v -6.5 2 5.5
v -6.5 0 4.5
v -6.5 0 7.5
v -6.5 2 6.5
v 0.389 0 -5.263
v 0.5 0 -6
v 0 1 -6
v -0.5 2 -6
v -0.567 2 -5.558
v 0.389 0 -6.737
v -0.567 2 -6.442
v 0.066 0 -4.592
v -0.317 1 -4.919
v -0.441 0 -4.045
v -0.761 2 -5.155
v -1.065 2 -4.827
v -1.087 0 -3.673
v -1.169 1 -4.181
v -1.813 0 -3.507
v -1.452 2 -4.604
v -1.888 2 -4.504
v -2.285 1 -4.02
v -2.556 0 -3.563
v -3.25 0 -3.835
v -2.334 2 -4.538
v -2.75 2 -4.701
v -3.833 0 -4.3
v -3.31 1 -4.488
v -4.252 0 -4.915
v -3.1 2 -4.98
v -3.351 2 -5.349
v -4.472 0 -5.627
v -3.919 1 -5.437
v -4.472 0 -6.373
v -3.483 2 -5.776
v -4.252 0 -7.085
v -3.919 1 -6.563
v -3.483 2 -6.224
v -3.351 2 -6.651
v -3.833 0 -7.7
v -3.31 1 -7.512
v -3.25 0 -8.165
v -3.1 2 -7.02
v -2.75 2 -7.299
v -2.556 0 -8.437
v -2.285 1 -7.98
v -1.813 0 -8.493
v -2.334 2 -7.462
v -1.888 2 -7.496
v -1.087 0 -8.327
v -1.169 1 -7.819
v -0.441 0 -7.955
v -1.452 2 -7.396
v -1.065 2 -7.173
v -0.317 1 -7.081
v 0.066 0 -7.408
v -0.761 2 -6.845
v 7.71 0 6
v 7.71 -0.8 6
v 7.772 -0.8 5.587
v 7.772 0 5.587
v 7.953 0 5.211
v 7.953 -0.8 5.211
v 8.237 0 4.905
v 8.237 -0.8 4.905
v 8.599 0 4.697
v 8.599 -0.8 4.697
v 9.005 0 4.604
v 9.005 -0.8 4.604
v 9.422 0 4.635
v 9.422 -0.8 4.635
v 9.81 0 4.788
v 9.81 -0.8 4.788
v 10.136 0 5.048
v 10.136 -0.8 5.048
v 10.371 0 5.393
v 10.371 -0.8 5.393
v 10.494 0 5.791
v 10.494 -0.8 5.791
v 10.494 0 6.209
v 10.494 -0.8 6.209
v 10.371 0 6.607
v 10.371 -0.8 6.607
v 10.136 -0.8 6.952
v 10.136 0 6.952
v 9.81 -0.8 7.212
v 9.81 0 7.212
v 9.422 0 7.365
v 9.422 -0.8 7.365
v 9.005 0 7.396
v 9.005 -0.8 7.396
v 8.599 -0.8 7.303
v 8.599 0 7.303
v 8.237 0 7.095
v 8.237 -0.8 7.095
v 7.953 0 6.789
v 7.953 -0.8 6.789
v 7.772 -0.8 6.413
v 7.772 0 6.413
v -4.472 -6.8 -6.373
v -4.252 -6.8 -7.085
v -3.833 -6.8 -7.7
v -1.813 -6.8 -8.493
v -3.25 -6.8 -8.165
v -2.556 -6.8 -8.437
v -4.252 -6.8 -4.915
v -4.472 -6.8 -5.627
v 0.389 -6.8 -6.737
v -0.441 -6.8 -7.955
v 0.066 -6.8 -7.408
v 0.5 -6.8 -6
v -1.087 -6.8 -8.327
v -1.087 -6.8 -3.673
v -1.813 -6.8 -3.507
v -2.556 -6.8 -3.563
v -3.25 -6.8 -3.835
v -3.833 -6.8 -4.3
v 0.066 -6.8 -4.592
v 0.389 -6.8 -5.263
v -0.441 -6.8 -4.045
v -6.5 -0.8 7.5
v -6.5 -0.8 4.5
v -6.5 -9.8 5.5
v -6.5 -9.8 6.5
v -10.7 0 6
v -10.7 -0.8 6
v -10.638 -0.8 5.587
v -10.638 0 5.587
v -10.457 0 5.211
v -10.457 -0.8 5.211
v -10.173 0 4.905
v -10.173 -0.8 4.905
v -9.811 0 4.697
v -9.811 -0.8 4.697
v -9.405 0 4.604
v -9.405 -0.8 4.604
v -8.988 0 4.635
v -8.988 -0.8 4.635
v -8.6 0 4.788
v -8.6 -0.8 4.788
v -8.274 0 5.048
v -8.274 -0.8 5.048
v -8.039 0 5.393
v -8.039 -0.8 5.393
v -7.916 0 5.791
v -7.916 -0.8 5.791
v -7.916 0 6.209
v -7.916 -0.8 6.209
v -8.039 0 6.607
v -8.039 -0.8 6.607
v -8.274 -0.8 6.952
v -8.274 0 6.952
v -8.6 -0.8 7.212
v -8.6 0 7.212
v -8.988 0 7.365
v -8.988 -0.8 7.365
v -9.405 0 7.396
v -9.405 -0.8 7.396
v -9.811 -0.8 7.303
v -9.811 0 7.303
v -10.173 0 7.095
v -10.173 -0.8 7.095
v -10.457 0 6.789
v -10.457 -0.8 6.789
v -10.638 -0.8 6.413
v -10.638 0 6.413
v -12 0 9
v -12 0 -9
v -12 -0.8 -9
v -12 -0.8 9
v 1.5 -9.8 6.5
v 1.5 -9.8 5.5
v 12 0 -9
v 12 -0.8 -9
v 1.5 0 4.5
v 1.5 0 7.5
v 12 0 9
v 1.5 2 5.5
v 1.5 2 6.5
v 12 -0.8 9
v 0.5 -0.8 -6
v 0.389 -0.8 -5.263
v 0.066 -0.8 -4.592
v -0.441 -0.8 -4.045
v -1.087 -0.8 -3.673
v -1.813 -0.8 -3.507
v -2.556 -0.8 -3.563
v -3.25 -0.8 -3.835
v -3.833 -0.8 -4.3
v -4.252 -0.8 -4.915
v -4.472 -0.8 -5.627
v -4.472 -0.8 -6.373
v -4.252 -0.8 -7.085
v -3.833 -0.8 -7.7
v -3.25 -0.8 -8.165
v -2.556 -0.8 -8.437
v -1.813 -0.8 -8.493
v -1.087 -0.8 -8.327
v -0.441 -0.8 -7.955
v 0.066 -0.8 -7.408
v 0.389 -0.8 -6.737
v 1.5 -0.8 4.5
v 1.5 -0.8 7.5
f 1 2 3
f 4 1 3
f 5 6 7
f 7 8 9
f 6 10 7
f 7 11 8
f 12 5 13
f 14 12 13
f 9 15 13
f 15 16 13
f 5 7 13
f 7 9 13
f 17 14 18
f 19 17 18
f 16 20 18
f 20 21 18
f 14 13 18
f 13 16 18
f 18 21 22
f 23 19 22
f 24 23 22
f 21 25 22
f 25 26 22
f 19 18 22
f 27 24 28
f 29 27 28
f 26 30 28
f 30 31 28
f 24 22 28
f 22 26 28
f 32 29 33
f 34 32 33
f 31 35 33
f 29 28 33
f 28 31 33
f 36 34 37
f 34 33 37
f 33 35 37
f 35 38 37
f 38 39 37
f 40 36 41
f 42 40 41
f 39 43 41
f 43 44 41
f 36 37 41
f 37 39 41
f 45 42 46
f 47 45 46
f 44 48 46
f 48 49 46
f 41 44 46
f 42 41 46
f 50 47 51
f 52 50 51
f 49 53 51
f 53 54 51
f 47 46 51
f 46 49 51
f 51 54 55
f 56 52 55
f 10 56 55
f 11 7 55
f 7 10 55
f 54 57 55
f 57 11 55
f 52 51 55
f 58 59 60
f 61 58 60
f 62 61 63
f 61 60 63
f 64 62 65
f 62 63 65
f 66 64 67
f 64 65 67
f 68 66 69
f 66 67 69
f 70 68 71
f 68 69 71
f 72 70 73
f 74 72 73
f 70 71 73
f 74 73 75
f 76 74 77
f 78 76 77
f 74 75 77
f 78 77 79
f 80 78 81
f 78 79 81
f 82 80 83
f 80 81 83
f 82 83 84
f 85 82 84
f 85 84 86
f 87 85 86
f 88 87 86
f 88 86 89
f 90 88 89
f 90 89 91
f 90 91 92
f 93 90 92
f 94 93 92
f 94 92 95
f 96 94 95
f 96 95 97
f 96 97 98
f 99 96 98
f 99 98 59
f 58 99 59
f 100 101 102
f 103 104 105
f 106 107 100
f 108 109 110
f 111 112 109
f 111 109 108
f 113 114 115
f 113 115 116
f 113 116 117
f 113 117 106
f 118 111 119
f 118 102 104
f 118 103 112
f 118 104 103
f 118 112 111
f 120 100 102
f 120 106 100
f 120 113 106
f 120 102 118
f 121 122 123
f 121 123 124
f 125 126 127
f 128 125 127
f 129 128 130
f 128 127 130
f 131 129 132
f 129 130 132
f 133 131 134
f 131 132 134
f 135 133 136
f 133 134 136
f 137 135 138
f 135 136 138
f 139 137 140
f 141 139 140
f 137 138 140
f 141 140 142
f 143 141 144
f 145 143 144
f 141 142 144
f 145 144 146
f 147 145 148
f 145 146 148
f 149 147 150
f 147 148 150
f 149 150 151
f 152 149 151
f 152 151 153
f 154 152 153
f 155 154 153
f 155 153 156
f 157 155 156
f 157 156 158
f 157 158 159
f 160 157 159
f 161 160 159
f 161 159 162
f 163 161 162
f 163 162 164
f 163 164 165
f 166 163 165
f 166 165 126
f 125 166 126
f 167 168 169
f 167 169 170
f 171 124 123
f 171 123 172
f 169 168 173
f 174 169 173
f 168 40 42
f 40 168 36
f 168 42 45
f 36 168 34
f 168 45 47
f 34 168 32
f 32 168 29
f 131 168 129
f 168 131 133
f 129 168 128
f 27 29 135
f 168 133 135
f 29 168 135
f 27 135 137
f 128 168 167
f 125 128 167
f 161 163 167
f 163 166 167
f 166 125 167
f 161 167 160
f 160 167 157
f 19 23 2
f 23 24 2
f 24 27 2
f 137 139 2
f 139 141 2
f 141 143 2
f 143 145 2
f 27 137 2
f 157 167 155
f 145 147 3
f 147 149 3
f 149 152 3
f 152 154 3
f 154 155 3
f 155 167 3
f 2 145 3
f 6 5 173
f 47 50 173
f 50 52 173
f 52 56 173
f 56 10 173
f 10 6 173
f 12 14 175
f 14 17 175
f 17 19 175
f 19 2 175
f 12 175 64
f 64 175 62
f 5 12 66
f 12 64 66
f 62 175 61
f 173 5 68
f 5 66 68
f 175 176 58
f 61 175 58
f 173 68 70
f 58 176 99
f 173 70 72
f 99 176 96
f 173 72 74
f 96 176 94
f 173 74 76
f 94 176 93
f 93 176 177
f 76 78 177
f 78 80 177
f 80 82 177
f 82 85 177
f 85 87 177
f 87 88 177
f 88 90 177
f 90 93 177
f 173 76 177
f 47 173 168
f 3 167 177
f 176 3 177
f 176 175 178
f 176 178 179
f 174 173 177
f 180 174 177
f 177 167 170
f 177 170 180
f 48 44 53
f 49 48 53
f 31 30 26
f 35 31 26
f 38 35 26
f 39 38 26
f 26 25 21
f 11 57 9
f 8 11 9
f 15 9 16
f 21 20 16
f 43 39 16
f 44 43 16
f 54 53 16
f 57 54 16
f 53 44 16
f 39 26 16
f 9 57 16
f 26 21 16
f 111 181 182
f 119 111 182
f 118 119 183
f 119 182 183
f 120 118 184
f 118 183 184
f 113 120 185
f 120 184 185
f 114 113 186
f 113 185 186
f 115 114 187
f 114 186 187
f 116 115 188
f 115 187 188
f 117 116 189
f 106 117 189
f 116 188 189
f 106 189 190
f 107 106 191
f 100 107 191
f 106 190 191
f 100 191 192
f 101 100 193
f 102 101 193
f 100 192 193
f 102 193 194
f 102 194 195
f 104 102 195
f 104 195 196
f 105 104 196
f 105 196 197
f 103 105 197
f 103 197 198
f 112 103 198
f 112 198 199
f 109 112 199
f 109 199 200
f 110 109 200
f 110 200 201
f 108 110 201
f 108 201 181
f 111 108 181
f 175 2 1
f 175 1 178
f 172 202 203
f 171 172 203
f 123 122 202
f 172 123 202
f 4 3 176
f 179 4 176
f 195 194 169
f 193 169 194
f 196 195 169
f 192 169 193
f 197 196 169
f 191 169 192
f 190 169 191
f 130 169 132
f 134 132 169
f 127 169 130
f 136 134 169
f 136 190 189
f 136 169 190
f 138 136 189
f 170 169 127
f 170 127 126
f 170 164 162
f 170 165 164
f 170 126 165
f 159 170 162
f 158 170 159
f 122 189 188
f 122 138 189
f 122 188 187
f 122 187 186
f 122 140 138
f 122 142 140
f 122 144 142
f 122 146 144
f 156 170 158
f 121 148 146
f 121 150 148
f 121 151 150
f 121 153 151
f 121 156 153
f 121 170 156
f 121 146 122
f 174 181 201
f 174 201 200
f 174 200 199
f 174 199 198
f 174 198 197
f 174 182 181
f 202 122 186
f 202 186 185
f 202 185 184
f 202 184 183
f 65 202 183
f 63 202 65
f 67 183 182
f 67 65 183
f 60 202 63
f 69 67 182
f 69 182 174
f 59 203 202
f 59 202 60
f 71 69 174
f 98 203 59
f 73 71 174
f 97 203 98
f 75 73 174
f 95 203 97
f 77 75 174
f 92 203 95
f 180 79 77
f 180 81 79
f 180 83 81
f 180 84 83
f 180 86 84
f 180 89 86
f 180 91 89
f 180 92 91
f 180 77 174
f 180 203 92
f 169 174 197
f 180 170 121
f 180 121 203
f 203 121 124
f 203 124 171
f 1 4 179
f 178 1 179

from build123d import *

# Parameters (mm, degrees)
F0_W     = 24
F0_H     = 18
F0_R     = 2.5
F0_W_2   = 8
F0_H_2   = 3
F1_DEPTH = 0.8
F2_D     = 2.8
F3_DEPTH = 2
F4_SIZE2 = 1.99999
F4_SIZE  = 0.99999
F5_SIZE2 = 0.99999
F5_SIZE  = 1.99999
F6_DEPTH = 6.8
F7_DEPTH = 9.8
F8_SIZE2 = 8.99999
F8_SIZE  = 0.99999


# Not quite as in the source:
# - a fillet or chamfer is up to 0.001 mm smaller than in the source, because OpenCascade refuses the exact size


with BuildPart() as f1:
    # F0 (on Front) → F1 (new body)
    with BuildSketch(Plane.XZ):
        Rectangle(F0_W, F0_H)
        with Locations((-2, -6)):
            Circle(F0_R, mode=Mode.SUBTRACT)
        with Locations((-2.5, 6)):
            Rectangle(F0_W_2, F0_H_2, mode=Mode.SUBTRACT)
        with Locations((-2.5, 6)):
            Rectangle(F0_W_2, F0_H_2)
        with Locations((-2, -6)):
            Circle(F0_R)
    extrude(amount=F1_DEPTH)

    # F2 (through all)
    with Locations(Plane(origin=(0, 0, 0), x_dir=(1, 0, 0), z_dir=(0, 1, 0))):
        with Locations((-9.3, -6), (9.11, -6)):
            Hole(F2_D / 2)

    # F0 (on Front) → F3 (join)
    with BuildSketch(Plane.XZ):
        with Locations((-2.5, 6)):
            Rectangle(F0_W_2, F0_H_2)
        with Locations((-2, -6)):
            Circle(F0_R)
    extrude(amount=-F3_DEPTH)

    # F4 (size 1 and 2 in the source; OpenCascade refuses exactly that, so slightly less here)
    f4_edges = [f1.edges().sort_by_distance(p)[0] for p in [
        (-2.5, 2, 4.5),
        (-2.5, 2, 7.5),
    ]]
    f4_side = f1.faces().sort_by_distance((-2.5, 2, 6))[0]
    chamfer(f4_edges, length=F4_SIZE, length2=F4_SIZE2, reference=f4_side)

    # F5 (size 2 and 1 in the source; OpenCascade refuses exactly that, so slightly less here)
    f5_edges = [f1.edges().sort_by_distance(p)[0] for p in [
        (-4.5, 2, -6),
    ]]
    f5_side = f1.faces().sort_by_distance((-4.5, 1, -6))[0]
    chamfer(f5_edges, length=F5_SIZE, length2=F5_SIZE2, reference=f5_side)

    # F0 (on Front) → F6 (join)
    with BuildSketch(Plane.XZ):
        with Locations((-2, -6)):
            Circle(F0_R)
    extrude(amount=F6_DEPTH)

    # F0 (on Front) → F7 (join)
    with BuildSketch(Plane.XZ):
        with Locations((-2.5, 6)):
            Rectangle(F0_W_2, F0_H_2)
    extrude(amount=F7_DEPTH)

    # F8 (size 1 and 9 in the source; OpenCascade refuses exactly that, so slightly less here)
    f8_edges = [f1.edges().sort_by_distance(p)[0] for p in [
        (-2.5, -9.8, 7.5),
        (-2.5, -9.8, 4.5),
    ]]
    f8_side = f1.faces().sort_by_distance((-2.5, -9.8, 6))[0]
    chamfer(f8_edges, length=F8_SIZE, length2=F8_SIZE2, reference=f8_side)


solid = f1.part
